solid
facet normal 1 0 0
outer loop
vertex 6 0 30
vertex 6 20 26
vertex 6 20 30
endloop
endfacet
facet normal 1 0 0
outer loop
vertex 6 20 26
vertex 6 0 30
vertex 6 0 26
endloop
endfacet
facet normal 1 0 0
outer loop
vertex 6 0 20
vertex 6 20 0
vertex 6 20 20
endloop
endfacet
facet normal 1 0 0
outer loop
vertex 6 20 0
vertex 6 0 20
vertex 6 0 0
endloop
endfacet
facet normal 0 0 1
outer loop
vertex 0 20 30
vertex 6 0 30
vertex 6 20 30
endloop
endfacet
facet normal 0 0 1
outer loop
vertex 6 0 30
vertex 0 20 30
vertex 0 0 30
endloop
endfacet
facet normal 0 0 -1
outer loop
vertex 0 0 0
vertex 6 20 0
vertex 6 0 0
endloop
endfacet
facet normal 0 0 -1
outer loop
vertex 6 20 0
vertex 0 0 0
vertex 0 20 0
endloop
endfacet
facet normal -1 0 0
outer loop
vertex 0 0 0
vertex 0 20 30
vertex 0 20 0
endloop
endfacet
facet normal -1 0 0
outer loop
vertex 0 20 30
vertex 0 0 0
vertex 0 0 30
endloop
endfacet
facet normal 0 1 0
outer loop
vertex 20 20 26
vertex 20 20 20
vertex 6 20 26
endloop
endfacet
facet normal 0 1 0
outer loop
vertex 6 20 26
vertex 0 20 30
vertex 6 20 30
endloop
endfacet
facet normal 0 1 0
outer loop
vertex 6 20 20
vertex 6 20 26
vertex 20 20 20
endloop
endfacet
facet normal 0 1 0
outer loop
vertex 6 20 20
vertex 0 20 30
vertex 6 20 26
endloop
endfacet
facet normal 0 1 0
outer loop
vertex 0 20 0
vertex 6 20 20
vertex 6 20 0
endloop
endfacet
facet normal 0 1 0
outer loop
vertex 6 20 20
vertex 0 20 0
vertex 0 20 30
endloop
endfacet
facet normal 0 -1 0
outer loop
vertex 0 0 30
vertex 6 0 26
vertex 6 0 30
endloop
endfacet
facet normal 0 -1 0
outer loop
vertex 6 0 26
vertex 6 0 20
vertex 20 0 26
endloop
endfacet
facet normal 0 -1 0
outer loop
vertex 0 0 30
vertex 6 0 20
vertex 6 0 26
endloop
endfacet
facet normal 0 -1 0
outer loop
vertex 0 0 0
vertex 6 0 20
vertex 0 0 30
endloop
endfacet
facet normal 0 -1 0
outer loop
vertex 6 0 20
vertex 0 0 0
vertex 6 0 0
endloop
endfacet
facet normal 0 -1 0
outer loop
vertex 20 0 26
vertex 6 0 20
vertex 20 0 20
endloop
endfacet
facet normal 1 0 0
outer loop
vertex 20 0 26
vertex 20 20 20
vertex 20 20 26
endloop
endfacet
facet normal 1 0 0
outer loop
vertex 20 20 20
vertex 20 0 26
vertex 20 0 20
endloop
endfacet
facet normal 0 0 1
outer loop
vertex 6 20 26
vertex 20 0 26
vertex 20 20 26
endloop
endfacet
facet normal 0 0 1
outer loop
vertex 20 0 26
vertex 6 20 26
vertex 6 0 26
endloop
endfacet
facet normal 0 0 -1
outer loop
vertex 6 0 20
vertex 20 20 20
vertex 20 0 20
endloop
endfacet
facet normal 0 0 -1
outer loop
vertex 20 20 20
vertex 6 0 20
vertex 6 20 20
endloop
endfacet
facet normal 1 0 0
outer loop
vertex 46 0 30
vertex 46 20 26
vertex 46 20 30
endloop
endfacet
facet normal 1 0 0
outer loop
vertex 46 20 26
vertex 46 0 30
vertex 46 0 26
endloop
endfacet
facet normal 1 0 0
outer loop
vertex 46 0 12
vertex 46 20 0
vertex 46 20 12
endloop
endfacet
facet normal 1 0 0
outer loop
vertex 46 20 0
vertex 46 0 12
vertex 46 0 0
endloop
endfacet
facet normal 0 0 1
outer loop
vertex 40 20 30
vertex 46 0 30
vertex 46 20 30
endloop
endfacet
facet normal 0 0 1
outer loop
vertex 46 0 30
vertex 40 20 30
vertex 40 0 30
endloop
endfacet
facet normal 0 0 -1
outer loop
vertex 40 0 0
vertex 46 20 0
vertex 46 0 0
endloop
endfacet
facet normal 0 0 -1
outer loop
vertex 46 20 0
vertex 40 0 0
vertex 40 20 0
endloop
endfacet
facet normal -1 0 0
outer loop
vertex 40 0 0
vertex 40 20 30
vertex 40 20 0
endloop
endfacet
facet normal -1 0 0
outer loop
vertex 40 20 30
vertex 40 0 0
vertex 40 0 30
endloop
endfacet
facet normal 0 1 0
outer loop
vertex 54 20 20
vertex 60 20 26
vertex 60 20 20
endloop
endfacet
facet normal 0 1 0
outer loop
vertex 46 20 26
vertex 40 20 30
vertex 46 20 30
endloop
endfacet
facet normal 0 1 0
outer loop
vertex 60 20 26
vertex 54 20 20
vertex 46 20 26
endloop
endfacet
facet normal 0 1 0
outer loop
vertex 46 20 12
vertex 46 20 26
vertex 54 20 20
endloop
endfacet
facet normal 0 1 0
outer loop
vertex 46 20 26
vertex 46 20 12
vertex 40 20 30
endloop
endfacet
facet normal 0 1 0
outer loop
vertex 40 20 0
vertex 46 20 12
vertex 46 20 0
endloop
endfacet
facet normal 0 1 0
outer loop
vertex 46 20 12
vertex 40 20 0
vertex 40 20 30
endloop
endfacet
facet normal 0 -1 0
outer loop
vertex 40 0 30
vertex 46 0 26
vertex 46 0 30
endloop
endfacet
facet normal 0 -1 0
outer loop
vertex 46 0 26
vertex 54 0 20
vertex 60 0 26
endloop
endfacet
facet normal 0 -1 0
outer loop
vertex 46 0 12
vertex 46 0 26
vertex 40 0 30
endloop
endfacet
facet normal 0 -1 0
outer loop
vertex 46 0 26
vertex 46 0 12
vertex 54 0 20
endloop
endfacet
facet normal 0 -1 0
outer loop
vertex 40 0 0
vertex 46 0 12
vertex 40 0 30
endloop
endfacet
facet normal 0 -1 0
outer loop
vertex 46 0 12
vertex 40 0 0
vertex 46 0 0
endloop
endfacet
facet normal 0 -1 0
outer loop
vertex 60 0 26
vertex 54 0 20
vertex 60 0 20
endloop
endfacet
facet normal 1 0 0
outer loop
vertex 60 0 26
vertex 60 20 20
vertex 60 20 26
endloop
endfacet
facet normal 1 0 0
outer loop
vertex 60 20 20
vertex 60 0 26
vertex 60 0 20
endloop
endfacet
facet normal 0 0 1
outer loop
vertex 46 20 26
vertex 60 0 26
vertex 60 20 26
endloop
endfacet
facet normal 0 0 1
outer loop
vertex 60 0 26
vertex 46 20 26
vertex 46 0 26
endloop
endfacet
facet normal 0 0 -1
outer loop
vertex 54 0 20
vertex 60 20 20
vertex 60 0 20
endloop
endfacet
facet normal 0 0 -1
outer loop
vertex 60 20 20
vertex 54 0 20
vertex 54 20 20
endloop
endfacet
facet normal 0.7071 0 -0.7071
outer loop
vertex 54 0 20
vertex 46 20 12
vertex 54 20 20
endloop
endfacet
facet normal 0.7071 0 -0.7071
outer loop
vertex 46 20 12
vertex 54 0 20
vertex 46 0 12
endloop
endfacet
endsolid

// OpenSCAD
// Chamfered vs flat overhang: two wall+ledge features side by side -- one
// a sharp flat 90deg overhang ledge, one the same ledge with a 45deg
// chamfer filling the underside corner (self-supporting).
wall_t = 6; depth = 20; wall_h = 30; ledge_h = 20; ledge_len = 14; ch = 8;

module ledge(chamfer) {
    union() {
        cube([wall_t, depth, wall_h]);
        translate([wall_t, 0, ledge_h]) cube([ledge_len, depth, 6]);
        if (chamfer) {
            translate([wall_t, depth, ledge_h])
            rotate([90, 0, 0])
            linear_extrude(height = depth)
            polygon(points = [[0, 0], [0, -ch], [ch, 0]]);
        }
    }
}

ledge(false);
translate([40, 0, 0]) ledge(true);
